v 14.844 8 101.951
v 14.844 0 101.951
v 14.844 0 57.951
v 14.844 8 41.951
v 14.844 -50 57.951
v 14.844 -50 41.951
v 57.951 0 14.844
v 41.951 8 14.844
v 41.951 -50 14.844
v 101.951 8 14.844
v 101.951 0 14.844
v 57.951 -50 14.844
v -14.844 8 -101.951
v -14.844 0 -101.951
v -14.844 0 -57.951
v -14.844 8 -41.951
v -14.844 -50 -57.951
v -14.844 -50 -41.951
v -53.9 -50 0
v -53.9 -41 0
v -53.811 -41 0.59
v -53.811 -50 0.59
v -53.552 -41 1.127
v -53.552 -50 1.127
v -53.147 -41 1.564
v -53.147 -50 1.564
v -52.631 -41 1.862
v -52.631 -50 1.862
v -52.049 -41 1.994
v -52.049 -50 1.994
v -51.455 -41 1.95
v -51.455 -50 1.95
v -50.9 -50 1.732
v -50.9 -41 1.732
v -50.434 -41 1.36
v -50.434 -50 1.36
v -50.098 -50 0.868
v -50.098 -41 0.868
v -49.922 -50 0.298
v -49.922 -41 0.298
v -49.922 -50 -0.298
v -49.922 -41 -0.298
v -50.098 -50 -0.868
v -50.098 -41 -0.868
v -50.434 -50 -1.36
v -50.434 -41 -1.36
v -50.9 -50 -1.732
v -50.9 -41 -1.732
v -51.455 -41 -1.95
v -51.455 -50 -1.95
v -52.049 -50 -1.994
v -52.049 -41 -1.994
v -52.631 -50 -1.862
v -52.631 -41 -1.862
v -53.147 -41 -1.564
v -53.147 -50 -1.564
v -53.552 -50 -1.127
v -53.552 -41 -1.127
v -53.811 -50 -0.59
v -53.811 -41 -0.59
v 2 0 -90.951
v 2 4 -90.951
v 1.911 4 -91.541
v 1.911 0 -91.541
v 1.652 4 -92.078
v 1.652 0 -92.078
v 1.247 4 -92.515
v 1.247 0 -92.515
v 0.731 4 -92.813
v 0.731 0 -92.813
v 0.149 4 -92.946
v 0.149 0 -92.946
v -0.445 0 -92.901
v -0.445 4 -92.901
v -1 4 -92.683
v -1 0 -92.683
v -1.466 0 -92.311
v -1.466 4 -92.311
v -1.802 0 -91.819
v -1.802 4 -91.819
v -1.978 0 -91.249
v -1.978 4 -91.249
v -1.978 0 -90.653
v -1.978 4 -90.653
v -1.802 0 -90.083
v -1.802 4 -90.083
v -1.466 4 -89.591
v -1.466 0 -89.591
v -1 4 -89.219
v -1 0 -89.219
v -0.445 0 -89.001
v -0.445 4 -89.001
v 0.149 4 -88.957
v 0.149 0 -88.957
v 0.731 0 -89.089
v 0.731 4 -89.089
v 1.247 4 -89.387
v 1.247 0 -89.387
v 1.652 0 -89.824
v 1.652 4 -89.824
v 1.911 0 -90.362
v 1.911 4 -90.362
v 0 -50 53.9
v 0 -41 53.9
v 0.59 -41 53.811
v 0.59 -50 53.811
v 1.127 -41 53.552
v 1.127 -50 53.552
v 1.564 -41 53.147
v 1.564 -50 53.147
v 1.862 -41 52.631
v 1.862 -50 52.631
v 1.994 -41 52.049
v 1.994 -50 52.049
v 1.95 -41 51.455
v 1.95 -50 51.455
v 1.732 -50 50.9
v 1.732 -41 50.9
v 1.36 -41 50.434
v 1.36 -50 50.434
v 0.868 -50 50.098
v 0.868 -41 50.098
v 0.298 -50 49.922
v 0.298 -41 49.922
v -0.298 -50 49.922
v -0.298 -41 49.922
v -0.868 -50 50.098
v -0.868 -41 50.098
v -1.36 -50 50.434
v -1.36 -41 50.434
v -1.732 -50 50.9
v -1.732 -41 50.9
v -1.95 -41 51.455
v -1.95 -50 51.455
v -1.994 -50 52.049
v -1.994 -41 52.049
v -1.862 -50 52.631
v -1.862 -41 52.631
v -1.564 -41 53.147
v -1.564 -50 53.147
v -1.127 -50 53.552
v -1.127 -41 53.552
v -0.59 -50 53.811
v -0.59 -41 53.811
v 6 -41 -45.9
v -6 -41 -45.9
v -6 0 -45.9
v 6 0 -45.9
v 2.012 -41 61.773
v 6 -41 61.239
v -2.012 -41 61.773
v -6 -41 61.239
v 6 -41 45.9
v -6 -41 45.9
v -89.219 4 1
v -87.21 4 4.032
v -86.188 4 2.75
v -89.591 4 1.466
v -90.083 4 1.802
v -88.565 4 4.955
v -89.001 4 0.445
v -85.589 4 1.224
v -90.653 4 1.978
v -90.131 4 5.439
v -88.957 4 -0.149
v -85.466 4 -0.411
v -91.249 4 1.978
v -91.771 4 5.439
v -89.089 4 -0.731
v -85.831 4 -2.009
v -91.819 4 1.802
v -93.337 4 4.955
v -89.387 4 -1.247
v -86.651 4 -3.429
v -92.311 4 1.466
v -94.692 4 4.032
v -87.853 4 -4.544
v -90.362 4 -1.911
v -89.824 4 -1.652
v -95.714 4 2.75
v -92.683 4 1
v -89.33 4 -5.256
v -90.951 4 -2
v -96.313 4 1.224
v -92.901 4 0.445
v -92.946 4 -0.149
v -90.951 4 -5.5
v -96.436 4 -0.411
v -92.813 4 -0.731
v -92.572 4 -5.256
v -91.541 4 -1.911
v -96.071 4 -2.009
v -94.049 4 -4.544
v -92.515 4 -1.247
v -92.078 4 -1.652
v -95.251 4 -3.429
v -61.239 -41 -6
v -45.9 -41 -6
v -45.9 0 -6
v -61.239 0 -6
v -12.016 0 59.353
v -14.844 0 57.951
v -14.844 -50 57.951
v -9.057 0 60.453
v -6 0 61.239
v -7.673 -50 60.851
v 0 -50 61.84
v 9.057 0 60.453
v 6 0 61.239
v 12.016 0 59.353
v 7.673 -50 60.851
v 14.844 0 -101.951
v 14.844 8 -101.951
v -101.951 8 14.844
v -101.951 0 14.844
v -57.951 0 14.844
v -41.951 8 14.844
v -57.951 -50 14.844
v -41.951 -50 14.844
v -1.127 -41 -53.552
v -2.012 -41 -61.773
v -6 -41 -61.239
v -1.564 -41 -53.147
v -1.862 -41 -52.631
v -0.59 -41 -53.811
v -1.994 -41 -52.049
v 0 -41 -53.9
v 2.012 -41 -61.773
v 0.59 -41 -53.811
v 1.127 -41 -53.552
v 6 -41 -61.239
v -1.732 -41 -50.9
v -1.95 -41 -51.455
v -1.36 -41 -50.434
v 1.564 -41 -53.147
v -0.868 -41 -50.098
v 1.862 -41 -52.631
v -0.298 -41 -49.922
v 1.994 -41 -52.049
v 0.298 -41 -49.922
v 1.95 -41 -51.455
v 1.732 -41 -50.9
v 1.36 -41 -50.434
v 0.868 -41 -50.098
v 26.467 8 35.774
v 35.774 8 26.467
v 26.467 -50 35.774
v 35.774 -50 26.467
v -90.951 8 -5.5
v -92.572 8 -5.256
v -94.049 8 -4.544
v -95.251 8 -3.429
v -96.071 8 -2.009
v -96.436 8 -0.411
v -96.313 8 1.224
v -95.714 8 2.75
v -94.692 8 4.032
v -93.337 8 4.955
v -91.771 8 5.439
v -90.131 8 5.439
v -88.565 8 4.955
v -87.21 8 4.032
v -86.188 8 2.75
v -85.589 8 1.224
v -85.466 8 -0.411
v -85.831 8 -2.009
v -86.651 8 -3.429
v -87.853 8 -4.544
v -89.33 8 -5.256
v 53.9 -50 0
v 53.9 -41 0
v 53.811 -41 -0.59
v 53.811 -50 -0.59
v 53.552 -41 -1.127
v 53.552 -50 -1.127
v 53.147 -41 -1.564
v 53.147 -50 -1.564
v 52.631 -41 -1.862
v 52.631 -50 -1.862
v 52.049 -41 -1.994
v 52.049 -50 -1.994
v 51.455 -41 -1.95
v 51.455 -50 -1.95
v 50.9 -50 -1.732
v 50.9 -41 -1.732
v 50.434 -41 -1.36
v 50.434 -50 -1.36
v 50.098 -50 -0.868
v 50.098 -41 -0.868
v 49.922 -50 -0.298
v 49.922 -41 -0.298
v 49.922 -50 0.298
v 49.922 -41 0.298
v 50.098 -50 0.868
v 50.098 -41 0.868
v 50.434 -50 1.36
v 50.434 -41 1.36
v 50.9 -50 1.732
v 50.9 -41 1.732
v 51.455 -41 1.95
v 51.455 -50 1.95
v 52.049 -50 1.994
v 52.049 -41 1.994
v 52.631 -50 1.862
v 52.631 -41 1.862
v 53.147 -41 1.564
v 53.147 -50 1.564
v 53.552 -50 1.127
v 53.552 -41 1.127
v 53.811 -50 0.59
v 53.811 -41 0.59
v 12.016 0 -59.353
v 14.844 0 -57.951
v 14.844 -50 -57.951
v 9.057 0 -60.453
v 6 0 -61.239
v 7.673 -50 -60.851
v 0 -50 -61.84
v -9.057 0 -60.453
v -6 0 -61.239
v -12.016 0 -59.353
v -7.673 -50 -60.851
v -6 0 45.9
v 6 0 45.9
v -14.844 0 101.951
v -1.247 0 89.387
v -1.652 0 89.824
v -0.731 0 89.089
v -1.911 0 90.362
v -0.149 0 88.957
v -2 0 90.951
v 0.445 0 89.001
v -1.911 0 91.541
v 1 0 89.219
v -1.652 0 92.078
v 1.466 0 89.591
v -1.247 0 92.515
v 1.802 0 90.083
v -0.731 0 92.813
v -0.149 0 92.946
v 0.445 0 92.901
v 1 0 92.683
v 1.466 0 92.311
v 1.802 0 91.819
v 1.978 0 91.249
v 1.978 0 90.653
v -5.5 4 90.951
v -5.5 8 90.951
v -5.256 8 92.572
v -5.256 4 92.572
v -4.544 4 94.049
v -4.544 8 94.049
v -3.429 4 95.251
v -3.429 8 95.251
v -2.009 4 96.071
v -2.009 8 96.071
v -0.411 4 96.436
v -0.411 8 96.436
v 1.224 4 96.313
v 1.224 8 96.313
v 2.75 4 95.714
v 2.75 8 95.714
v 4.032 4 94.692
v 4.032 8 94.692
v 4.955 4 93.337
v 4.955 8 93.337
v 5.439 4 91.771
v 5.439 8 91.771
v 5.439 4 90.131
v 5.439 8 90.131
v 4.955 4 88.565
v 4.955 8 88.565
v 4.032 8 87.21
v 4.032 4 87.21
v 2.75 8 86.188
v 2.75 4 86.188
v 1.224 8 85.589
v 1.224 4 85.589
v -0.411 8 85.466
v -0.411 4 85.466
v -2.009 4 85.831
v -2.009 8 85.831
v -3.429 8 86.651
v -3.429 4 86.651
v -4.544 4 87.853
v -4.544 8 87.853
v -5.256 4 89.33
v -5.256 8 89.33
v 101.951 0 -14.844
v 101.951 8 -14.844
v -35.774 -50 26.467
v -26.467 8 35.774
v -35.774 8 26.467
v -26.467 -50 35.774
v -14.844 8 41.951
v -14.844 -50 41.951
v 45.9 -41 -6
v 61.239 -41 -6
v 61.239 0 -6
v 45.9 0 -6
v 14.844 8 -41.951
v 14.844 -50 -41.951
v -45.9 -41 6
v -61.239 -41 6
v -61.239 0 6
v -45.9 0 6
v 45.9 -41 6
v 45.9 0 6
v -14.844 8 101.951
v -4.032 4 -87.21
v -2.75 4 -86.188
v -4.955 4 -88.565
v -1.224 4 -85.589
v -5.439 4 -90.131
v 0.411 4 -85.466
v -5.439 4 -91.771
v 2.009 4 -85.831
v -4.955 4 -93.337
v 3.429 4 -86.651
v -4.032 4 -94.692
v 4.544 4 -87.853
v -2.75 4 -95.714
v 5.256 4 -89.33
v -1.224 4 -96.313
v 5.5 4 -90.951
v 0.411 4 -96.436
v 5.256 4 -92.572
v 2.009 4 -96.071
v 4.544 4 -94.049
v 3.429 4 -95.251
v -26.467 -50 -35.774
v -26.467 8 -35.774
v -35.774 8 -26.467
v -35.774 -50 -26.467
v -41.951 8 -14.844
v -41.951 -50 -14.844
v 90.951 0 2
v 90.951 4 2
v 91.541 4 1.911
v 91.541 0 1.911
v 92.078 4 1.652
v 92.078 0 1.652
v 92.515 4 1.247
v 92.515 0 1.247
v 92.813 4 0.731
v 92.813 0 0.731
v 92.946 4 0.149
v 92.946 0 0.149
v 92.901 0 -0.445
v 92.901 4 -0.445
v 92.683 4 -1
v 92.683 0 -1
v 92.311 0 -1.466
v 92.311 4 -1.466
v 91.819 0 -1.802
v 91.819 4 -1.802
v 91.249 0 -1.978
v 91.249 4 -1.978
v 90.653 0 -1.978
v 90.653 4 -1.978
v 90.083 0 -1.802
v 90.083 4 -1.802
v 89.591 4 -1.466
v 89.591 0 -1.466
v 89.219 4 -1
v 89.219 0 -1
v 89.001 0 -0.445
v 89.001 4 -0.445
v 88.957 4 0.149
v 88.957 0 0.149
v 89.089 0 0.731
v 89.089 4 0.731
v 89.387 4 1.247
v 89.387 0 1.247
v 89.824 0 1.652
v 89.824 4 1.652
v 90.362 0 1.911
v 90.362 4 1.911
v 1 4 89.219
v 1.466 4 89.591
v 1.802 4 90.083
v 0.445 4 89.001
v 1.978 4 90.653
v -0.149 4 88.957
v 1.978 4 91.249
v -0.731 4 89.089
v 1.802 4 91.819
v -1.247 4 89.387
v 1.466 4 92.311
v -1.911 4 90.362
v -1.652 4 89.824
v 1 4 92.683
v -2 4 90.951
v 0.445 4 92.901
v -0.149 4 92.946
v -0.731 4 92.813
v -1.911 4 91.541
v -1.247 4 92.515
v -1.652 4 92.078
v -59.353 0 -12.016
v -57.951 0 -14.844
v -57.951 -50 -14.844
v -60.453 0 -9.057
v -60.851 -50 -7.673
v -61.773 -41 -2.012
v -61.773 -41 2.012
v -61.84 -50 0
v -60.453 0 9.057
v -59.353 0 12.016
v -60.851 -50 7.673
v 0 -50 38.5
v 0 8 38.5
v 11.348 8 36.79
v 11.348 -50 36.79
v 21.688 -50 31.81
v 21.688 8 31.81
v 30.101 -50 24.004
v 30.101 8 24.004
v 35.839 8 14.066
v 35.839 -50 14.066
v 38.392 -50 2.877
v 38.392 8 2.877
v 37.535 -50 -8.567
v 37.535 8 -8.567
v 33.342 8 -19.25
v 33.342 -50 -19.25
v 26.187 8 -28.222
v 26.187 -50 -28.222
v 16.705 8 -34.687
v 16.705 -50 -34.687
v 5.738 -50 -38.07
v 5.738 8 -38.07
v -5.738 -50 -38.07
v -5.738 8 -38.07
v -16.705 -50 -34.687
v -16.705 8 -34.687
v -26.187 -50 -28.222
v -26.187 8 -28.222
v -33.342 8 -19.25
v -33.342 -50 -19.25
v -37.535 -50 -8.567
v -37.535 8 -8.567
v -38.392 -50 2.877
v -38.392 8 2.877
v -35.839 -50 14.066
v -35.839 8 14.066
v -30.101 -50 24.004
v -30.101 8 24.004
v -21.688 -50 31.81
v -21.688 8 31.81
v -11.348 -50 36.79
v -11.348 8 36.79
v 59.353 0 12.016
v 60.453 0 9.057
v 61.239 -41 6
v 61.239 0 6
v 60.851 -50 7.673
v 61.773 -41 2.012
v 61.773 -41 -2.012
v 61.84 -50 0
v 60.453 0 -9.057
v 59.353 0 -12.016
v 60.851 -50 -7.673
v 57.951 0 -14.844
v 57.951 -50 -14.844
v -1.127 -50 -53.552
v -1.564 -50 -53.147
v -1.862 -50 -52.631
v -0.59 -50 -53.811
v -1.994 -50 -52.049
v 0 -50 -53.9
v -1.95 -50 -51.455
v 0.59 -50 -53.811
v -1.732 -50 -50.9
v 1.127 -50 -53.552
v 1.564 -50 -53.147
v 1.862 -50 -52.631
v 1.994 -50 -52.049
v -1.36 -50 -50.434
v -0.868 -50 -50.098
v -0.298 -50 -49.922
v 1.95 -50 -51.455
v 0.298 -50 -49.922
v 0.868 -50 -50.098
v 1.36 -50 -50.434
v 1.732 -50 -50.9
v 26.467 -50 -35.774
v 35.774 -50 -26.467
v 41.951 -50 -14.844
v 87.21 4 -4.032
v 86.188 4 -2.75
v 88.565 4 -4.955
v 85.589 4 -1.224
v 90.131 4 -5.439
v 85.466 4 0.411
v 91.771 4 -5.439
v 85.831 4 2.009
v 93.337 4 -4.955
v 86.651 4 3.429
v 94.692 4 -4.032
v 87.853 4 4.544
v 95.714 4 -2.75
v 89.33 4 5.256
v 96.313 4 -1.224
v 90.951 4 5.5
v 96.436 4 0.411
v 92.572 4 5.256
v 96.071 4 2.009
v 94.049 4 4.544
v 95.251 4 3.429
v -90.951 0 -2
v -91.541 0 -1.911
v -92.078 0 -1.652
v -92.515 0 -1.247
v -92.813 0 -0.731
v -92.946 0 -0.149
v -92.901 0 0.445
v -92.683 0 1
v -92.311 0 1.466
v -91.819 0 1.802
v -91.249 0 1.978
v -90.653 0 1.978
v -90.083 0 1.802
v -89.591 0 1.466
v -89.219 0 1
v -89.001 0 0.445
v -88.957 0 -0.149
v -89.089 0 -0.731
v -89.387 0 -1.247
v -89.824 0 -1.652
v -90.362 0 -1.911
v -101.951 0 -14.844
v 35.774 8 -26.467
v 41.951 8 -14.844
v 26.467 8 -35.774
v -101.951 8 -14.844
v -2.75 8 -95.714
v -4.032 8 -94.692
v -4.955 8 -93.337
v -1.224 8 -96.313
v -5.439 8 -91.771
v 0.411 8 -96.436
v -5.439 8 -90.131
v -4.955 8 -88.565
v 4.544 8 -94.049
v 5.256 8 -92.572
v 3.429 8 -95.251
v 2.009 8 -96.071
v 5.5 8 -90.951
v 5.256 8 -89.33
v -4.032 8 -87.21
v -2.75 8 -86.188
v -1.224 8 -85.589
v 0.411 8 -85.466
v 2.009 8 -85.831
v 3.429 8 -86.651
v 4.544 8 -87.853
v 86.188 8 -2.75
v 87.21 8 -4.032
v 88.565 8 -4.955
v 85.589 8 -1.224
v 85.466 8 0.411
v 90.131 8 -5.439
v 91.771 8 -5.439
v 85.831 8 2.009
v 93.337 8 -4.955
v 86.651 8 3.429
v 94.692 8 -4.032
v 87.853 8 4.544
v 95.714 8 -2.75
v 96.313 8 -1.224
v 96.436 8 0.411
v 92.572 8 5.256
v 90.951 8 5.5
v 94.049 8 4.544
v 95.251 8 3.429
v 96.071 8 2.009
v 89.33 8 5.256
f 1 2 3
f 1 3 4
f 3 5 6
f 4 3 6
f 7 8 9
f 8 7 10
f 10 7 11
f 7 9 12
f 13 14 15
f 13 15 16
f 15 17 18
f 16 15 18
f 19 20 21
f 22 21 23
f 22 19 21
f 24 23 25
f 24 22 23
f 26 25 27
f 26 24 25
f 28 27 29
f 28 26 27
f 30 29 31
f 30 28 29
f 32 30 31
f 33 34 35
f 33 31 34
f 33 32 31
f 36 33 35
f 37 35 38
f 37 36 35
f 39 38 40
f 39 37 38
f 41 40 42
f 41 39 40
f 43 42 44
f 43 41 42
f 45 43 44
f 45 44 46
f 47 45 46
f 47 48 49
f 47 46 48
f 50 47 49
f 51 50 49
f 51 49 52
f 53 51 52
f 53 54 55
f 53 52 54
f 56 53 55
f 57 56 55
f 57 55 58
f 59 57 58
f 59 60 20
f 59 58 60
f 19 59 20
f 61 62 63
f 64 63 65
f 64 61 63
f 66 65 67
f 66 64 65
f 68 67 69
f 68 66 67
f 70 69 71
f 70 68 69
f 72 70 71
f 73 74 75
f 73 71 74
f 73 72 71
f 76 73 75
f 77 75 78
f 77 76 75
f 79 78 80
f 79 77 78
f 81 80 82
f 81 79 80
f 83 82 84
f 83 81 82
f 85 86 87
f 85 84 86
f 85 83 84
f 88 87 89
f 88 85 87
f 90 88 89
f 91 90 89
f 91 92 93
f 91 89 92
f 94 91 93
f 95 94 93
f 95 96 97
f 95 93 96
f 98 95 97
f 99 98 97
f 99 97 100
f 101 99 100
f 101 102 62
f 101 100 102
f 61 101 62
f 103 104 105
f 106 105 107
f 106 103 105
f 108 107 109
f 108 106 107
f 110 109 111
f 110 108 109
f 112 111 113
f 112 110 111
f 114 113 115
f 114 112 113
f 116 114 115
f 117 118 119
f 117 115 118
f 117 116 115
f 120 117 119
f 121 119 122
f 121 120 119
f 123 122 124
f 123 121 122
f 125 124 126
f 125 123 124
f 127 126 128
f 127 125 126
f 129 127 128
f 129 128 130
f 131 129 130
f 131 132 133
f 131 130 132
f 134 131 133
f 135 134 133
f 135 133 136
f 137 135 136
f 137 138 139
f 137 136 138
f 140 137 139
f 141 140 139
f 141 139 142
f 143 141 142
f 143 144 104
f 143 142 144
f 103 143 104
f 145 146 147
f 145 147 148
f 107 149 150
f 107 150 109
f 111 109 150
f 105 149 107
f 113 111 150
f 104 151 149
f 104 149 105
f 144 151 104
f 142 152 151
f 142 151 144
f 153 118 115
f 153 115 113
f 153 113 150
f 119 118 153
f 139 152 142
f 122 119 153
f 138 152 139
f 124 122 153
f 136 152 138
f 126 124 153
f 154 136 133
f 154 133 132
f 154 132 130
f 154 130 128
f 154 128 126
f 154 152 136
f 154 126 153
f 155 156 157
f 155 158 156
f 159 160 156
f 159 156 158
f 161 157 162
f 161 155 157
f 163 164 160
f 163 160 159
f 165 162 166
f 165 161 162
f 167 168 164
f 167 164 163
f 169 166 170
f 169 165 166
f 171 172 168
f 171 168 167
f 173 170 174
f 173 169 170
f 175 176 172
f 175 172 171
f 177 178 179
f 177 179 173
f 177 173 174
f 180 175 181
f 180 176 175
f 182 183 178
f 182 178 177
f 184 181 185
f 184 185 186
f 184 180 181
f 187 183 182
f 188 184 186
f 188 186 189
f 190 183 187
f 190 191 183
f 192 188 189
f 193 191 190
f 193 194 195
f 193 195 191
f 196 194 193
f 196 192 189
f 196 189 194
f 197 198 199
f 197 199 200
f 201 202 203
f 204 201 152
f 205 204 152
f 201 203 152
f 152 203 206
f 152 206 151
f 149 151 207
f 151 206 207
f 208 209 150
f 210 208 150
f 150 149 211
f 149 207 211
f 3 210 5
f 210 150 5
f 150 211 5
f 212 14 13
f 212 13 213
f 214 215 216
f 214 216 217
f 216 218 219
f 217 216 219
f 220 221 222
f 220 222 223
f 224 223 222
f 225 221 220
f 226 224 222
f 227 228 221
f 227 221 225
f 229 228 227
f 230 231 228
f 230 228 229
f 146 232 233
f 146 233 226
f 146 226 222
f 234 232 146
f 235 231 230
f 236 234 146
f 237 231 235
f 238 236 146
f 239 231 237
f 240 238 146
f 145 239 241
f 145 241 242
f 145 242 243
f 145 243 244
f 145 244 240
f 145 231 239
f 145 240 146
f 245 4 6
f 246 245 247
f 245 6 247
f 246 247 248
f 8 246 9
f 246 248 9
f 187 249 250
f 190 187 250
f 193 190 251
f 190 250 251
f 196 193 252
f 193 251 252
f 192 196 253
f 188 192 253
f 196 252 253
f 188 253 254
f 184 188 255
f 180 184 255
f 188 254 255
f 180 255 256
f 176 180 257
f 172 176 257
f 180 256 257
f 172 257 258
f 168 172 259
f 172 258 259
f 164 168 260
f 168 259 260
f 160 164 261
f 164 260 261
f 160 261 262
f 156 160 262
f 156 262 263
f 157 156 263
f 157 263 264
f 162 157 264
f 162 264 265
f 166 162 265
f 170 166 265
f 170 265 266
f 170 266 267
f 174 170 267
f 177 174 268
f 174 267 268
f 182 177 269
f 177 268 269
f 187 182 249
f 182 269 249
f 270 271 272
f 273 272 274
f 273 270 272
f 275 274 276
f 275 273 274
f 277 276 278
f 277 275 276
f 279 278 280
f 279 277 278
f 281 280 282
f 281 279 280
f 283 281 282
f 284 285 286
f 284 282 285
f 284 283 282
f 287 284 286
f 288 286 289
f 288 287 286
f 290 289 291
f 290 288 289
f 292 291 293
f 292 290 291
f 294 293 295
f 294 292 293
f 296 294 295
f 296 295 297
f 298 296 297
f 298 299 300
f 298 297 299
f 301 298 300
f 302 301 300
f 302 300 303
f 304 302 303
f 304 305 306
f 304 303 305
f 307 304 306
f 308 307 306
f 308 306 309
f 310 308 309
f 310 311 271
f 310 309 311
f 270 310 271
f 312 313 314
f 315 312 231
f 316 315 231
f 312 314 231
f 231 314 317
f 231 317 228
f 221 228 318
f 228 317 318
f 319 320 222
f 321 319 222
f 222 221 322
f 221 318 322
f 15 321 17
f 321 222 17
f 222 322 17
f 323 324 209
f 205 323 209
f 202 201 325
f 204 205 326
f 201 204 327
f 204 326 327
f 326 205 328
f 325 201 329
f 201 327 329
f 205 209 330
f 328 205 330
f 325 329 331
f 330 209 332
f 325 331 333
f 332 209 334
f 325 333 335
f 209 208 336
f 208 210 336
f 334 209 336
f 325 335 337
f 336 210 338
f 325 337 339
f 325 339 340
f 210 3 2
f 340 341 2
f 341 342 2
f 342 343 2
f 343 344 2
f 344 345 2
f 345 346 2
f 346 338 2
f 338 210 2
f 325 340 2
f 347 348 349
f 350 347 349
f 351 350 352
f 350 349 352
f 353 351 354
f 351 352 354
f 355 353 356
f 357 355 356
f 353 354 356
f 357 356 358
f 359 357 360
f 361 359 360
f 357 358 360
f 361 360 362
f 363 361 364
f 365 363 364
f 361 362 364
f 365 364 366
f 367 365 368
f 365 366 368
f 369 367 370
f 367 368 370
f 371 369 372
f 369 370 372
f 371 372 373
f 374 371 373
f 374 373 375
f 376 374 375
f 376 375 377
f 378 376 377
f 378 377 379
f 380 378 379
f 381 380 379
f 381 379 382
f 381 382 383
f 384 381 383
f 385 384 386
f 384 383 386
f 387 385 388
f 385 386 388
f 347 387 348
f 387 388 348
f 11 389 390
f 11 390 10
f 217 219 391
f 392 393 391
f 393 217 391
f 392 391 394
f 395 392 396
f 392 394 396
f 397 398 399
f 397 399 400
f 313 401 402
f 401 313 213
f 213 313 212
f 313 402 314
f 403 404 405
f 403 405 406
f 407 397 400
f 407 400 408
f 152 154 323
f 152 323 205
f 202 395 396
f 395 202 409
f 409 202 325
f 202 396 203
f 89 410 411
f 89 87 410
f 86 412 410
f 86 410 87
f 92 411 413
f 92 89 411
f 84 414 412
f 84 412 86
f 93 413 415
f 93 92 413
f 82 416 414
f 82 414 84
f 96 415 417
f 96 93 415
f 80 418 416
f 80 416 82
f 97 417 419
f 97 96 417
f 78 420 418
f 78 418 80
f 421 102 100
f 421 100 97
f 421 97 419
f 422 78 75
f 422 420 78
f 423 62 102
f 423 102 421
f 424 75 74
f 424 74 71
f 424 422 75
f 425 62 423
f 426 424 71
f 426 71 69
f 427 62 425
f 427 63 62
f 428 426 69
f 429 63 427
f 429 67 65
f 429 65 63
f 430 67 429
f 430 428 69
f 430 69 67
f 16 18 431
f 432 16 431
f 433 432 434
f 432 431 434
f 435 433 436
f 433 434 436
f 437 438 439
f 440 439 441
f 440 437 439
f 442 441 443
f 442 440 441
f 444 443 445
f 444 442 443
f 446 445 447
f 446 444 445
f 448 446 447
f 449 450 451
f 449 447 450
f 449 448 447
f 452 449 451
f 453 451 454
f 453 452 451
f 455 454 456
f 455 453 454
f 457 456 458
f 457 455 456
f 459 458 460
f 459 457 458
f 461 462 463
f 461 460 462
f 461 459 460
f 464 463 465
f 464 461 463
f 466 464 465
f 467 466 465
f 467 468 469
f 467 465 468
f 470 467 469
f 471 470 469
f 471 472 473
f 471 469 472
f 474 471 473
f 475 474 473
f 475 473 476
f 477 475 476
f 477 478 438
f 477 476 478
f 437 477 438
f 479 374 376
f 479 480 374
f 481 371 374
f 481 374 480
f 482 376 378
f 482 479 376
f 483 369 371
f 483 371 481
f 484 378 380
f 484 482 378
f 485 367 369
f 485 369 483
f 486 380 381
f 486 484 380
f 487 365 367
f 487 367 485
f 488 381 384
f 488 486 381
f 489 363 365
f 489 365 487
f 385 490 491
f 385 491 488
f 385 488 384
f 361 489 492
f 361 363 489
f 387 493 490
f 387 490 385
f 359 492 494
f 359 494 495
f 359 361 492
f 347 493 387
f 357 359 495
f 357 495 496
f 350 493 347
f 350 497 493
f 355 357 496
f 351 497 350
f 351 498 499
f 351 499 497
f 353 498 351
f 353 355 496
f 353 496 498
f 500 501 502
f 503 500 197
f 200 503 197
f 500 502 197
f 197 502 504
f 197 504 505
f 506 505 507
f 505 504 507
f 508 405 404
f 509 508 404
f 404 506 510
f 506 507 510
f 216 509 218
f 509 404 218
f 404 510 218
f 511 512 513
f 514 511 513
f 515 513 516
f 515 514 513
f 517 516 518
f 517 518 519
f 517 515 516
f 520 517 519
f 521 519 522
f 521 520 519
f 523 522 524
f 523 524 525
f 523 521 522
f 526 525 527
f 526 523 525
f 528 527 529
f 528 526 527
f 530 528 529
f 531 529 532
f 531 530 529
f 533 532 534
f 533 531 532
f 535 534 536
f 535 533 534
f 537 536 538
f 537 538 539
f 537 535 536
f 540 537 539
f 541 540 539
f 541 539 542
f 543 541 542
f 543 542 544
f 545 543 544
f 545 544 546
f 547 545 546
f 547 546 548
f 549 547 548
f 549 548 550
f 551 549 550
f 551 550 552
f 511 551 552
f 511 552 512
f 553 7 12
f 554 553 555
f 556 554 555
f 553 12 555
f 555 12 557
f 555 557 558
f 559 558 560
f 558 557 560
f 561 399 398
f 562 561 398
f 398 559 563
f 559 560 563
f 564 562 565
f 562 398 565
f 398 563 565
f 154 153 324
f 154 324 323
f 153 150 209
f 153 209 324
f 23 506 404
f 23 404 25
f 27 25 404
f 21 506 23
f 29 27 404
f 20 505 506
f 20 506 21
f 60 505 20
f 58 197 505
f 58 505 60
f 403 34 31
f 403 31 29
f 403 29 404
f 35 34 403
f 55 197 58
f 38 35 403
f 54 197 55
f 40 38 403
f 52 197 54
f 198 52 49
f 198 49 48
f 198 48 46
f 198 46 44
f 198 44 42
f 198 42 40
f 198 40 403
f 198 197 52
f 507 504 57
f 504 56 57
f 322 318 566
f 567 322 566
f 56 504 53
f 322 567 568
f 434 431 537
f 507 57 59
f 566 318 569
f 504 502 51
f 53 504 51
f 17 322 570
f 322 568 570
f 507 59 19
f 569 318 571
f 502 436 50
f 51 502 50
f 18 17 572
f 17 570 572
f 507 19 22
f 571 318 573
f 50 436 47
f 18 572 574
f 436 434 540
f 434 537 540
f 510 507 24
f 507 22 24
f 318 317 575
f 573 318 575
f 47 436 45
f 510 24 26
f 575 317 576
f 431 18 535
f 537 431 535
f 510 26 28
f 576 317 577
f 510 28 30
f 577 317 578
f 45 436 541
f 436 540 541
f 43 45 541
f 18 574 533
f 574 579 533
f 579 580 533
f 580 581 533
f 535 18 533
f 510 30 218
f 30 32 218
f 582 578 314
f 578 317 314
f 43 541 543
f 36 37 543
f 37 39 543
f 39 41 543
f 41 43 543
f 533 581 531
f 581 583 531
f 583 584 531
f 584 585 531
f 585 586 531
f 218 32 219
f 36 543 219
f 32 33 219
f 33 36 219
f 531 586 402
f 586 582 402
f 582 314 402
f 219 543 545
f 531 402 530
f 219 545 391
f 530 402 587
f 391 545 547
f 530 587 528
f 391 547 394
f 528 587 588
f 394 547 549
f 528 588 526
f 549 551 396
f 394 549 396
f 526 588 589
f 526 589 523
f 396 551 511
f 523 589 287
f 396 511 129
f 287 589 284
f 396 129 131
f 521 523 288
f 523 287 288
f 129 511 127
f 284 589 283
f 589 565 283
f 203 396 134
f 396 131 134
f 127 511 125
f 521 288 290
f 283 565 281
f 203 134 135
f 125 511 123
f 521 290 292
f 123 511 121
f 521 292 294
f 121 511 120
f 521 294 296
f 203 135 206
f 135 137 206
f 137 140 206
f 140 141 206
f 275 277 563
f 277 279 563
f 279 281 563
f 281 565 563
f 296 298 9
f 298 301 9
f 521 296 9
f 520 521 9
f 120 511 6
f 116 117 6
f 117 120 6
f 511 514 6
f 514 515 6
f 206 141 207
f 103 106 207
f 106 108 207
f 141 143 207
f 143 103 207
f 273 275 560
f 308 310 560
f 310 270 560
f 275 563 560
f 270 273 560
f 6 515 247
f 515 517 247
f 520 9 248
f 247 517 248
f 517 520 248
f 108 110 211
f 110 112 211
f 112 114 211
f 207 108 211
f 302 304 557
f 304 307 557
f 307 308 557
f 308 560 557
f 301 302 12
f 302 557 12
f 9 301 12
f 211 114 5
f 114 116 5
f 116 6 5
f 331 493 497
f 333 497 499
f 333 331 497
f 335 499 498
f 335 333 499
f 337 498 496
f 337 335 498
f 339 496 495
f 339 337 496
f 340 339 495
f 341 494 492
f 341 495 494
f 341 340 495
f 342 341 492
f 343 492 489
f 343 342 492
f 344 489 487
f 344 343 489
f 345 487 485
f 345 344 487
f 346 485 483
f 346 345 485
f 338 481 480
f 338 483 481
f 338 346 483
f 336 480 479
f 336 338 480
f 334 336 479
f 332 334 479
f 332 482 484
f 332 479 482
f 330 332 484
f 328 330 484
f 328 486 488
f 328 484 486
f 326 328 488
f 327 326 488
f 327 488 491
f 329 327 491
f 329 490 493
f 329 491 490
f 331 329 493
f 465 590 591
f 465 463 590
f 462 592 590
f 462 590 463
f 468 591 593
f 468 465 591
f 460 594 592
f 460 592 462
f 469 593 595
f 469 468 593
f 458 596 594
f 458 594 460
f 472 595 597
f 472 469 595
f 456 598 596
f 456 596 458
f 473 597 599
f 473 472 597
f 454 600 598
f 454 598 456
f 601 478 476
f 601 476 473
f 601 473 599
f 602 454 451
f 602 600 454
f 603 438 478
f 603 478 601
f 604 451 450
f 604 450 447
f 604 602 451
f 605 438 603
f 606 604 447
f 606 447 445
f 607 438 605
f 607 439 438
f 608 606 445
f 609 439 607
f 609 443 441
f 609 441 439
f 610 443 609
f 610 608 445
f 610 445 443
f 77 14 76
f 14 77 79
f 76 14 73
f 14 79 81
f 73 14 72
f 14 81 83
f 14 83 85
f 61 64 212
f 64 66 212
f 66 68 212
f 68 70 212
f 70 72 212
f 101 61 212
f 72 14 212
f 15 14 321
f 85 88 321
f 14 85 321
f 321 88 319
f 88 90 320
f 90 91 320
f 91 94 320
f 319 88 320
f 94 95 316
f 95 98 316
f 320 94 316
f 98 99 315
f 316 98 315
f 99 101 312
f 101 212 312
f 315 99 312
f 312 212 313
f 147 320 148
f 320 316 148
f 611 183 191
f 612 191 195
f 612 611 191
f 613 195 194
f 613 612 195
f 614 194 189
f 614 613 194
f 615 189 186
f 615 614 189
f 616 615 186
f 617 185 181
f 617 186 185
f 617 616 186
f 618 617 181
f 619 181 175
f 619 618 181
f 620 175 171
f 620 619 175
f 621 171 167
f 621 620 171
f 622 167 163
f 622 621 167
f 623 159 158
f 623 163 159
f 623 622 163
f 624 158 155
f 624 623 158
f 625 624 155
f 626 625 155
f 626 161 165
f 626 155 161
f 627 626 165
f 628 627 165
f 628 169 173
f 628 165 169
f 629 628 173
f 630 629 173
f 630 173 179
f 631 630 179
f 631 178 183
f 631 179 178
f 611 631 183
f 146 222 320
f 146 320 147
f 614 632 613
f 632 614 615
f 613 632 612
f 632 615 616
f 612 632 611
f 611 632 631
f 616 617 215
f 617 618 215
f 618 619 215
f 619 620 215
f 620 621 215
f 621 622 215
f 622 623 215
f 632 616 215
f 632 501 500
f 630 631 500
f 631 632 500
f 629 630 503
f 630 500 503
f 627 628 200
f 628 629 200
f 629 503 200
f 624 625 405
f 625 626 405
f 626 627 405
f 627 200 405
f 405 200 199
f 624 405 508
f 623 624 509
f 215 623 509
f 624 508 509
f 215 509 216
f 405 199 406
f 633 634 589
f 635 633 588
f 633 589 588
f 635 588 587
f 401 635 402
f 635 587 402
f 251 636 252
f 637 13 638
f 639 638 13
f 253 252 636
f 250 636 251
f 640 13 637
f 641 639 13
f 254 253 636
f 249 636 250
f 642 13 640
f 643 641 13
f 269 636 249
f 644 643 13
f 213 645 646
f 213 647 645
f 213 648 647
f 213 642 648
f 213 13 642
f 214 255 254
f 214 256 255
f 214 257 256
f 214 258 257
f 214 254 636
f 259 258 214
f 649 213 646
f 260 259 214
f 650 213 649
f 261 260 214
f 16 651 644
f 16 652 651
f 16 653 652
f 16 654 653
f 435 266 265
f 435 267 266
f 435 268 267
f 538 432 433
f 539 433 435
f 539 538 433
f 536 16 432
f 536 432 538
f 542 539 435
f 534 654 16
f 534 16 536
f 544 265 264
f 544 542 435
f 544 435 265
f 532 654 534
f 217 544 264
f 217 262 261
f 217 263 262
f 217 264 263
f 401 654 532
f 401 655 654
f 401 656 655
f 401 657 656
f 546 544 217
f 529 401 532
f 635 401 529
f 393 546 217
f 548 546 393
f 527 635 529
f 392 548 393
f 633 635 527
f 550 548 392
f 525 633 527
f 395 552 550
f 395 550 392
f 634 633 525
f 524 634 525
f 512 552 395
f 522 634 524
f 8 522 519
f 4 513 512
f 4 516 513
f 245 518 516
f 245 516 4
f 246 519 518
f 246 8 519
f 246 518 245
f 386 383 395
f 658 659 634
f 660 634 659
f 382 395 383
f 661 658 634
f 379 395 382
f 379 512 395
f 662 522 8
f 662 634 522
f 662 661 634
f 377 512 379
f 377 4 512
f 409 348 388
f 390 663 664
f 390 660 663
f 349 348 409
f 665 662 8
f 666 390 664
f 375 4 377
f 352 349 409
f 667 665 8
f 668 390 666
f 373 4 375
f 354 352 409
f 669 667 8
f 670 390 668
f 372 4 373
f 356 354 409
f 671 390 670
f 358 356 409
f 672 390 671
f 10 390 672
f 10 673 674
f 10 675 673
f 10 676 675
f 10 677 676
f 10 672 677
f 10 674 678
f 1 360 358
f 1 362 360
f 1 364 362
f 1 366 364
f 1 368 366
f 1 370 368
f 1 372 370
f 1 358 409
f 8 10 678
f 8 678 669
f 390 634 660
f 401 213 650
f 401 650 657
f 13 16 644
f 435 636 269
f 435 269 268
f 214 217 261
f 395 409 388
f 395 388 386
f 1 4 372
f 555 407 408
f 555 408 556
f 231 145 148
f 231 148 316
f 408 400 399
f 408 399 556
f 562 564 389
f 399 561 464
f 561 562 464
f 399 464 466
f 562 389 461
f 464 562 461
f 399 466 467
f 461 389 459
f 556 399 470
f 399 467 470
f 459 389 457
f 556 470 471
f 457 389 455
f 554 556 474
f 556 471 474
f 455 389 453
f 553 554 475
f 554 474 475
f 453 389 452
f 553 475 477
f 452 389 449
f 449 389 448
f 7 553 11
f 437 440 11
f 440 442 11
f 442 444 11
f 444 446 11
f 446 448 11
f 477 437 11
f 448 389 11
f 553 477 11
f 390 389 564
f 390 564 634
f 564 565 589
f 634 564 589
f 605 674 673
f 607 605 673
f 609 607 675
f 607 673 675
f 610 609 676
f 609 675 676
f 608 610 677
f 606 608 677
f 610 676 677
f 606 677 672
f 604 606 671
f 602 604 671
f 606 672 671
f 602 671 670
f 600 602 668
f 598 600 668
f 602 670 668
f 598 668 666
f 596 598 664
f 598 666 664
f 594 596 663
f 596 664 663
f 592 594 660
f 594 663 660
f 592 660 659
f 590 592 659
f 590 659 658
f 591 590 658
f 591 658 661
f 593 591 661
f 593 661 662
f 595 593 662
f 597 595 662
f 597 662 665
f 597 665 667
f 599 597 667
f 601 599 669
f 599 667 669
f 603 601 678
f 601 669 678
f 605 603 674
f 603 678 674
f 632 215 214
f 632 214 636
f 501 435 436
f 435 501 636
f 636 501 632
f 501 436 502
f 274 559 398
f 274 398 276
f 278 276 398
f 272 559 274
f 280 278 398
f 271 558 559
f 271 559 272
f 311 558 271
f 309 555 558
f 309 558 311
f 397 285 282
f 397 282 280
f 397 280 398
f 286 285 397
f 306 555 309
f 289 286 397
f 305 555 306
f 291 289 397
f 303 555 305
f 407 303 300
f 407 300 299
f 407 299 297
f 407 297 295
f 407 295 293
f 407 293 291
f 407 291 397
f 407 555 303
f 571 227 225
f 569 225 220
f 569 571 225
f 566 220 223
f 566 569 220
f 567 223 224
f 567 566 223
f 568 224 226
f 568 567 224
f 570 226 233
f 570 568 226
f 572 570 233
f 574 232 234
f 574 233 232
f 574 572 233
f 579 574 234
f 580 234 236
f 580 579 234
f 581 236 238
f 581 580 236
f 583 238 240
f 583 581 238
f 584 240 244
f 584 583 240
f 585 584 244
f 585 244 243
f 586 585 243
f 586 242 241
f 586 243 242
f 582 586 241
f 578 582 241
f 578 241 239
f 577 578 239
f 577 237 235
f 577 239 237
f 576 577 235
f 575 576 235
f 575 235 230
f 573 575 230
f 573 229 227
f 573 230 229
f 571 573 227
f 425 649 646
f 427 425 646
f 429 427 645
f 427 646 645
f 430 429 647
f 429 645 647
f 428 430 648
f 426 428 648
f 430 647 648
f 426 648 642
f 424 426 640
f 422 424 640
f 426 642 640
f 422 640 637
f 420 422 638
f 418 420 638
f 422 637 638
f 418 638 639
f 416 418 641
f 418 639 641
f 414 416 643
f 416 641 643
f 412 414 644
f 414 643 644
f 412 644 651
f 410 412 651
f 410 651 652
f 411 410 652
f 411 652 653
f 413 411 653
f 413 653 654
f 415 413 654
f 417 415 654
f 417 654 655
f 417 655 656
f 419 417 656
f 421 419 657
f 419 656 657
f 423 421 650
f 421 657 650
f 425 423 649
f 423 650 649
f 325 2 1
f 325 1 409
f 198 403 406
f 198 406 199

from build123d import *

# Parameters (mm, degrees)
SKETCH1_R           = 44.5
SKETCH1_R_2         = 38.5
BOSS_EXTRUDE1_DEPTH = 8
SKETCH2_R           = 2
BOSS_EXTRUDE2_DEPTH = 8
CIRPATTERN3_COUNT   = 4
BOSS_EXTRUDE3_START = -50
SKETCH5_R           = 44.5
SKETCH5_R_2         = 38.5
BOSS_EXTRUDE3_DEPTH = 50
BOSS_EXTRUDE4_START = -50
SKETCH7_R           = 2
BOSS_EXTRUDE4_DEPTH = 50
CIRPATTERN4_COUNT   = 4
CUT_EXTRUDE2_START  = 41
CUT_EXTRUDE2_DEPTH  = 41
CIRPATTERN5_COUNT   = 4
SKETCH9_R           = 5.5
CUT_EXTRUDE3_DEPTH  = 4
CIRPATTERN6_COUNT   = 4


with BuildPart() as part:
    # Sketch1 → Boss-Extrude1 (new body)
    with BuildSketch(Plane(origin=(0, 0, 0), x_dir=(1, 0, 0), z_dir=(0, 1, 0))):
        Circle(SKETCH1_R)
        Circle(SKETCH1_R_2, mode=Mode.SUBTRACT)
    extrude(amount=BOSS_EXTRUDE1_DEPTH)

    # Sketch2 → Boss-Extrude2 (add)
    with BuildSketch(Plane(origin=(0, 0, 0), x_dir=(1, 0, 0), z_dir=(0, 1, 0))):
        with BuildLine():
            Line((41.951101238, 14.844362731), (101.951101238, 14.844362731))
            Line((101.951101238, 14.844362731), (101.951101238, -14.844362731))
            Line((101.951101238, -14.844362731), (41.951101238, -14.844362731))
            ThreePointArc((41.951101238, -14.844362731), (44.5, 0), (41.951101238, 14.844362731))
        make_face()
        with Locations((90.951101238, 0)):
            Circle(SKETCH2_R, mode=Mode.SUBTRACT)
    boss_extrude2 = extrude(amount=BOSS_EXTRUDE2_DEPTH)

    # CirPattern3: Boss-Extrude2 ×4 about axis
    cirpattern3_axis = Axis((0, 8, 0), (0, -1, 0))
    for i in range(1, CIRPATTERN3_COUNT):
        add(boss_extrude2.rotate(cirpattern3_axis, i * 360 / CIRPATTERN3_COUNT))

    # Sketch5 → Boss-Extrude3 (add)
    with BuildSketch(Plane(origin=(0, 0, 0), x_dir=(1, 0, 0), z_dir=(0, 1, 0)).offset(BOSS_EXTRUDE3_START)):
        Circle(SKETCH5_R)
        Circle(SKETCH5_R_2, mode=Mode.SUBTRACT)
    extrude(amount=BOSS_EXTRUDE3_DEPTH)

    # Sketch7 → Boss-Extrude4 (add)
    with BuildSketch(Plane(origin=(0, 0, 0), x_dir=(1, 0, 0), z_dir=(0, 1, 0)).offset(BOSS_EXTRUDE4_START)):
        with BuildLine():
            Line((41.951101238, 14.844362731), (57.951101238, 14.844362731))
            ThreePointArc((57.951101238, 14.844362731), (61.83977211, 0), (57.951101238, -14.844362731))
            Line((57.951101238, -14.844362731), (41.951101238, -14.844362731))
            ThreePointArc((41.951101238, -14.844362731), (44.5, 0), (41.951101238, 14.844362731))
        make_face()
        with Locations((51.9, 0)):
            Circle(SKETCH7_R, mode=Mode.SUBTRACT)
    boss_extrude4 = extrude(amount=BOSS_EXTRUDE4_DEPTH)

    # CirPattern4: Boss-Extrude4 ×4 about axis
    cirpattern4_axis = Axis((0, 8, 0), (0, -1, 0))
    for i in range(1, CIRPATTERN4_COUNT):
        add(boss_extrude4.rotate(cirpattern4_axis, i * 360 / CIRPATTERN4_COUNT))

    # Sketch8 → Cut-Extrude2 (cut)
    with BuildSketch(Plane.XZ.offset(CUT_EXTRUDE2_START)):
        with BuildLine():
            Line((61.239313057, -6), (45.9, -6))
            Line((45.9, -6), (45.9, 6))
            Line((45.9, 6), (61.239313057, 6))
            ThreePointArc((61.239313057, 6), (61.83977211, 0), (61.239313057, -6))
        make_face()
    cut_extrude2 = extrude(amount=-CUT_EXTRUDE2_DEPTH, mode=Mode.SUBTRACT)

    # CirPattern5: Cut-Extrude2 ×4 about axis
    cirpattern5_axis = Axis((0, 8, 0), (0, -1, 0))
    for i in range(1, CIRPATTERN5_COUNT):
        add(cut_extrude2.rotate(cirpattern5_axis, i * 360 / CIRPATTERN5_COUNT), mode=Mode.SUBTRACT)

    # Sketch9 → Cut-Extrude3 (cut)
    with BuildSketch(Plane(origin=(0, 8, 0), x_dir=(1, 0, 0), z_dir=(0, 1, 0))):
        with Locations((90.951101238, 0)):
            Circle(SKETCH9_R)
    cut_extrude3 = extrude(amount=-CUT_EXTRUDE3_DEPTH, mode=Mode.SUBTRACT)

    # CirPattern6: Cut-Extrude3 ×4 about axis
    cirpattern6_axis = Axis((0, 8, 0), (0, -1, 0))
    for i in range(1, CIRPATTERN6_COUNT):
        add(cut_extrude3.rotate(cirpattern6_axis, i * 360 / CIRPATTERN6_COUNT), mode=Mode.SUBTRACT)


solid = part.part
